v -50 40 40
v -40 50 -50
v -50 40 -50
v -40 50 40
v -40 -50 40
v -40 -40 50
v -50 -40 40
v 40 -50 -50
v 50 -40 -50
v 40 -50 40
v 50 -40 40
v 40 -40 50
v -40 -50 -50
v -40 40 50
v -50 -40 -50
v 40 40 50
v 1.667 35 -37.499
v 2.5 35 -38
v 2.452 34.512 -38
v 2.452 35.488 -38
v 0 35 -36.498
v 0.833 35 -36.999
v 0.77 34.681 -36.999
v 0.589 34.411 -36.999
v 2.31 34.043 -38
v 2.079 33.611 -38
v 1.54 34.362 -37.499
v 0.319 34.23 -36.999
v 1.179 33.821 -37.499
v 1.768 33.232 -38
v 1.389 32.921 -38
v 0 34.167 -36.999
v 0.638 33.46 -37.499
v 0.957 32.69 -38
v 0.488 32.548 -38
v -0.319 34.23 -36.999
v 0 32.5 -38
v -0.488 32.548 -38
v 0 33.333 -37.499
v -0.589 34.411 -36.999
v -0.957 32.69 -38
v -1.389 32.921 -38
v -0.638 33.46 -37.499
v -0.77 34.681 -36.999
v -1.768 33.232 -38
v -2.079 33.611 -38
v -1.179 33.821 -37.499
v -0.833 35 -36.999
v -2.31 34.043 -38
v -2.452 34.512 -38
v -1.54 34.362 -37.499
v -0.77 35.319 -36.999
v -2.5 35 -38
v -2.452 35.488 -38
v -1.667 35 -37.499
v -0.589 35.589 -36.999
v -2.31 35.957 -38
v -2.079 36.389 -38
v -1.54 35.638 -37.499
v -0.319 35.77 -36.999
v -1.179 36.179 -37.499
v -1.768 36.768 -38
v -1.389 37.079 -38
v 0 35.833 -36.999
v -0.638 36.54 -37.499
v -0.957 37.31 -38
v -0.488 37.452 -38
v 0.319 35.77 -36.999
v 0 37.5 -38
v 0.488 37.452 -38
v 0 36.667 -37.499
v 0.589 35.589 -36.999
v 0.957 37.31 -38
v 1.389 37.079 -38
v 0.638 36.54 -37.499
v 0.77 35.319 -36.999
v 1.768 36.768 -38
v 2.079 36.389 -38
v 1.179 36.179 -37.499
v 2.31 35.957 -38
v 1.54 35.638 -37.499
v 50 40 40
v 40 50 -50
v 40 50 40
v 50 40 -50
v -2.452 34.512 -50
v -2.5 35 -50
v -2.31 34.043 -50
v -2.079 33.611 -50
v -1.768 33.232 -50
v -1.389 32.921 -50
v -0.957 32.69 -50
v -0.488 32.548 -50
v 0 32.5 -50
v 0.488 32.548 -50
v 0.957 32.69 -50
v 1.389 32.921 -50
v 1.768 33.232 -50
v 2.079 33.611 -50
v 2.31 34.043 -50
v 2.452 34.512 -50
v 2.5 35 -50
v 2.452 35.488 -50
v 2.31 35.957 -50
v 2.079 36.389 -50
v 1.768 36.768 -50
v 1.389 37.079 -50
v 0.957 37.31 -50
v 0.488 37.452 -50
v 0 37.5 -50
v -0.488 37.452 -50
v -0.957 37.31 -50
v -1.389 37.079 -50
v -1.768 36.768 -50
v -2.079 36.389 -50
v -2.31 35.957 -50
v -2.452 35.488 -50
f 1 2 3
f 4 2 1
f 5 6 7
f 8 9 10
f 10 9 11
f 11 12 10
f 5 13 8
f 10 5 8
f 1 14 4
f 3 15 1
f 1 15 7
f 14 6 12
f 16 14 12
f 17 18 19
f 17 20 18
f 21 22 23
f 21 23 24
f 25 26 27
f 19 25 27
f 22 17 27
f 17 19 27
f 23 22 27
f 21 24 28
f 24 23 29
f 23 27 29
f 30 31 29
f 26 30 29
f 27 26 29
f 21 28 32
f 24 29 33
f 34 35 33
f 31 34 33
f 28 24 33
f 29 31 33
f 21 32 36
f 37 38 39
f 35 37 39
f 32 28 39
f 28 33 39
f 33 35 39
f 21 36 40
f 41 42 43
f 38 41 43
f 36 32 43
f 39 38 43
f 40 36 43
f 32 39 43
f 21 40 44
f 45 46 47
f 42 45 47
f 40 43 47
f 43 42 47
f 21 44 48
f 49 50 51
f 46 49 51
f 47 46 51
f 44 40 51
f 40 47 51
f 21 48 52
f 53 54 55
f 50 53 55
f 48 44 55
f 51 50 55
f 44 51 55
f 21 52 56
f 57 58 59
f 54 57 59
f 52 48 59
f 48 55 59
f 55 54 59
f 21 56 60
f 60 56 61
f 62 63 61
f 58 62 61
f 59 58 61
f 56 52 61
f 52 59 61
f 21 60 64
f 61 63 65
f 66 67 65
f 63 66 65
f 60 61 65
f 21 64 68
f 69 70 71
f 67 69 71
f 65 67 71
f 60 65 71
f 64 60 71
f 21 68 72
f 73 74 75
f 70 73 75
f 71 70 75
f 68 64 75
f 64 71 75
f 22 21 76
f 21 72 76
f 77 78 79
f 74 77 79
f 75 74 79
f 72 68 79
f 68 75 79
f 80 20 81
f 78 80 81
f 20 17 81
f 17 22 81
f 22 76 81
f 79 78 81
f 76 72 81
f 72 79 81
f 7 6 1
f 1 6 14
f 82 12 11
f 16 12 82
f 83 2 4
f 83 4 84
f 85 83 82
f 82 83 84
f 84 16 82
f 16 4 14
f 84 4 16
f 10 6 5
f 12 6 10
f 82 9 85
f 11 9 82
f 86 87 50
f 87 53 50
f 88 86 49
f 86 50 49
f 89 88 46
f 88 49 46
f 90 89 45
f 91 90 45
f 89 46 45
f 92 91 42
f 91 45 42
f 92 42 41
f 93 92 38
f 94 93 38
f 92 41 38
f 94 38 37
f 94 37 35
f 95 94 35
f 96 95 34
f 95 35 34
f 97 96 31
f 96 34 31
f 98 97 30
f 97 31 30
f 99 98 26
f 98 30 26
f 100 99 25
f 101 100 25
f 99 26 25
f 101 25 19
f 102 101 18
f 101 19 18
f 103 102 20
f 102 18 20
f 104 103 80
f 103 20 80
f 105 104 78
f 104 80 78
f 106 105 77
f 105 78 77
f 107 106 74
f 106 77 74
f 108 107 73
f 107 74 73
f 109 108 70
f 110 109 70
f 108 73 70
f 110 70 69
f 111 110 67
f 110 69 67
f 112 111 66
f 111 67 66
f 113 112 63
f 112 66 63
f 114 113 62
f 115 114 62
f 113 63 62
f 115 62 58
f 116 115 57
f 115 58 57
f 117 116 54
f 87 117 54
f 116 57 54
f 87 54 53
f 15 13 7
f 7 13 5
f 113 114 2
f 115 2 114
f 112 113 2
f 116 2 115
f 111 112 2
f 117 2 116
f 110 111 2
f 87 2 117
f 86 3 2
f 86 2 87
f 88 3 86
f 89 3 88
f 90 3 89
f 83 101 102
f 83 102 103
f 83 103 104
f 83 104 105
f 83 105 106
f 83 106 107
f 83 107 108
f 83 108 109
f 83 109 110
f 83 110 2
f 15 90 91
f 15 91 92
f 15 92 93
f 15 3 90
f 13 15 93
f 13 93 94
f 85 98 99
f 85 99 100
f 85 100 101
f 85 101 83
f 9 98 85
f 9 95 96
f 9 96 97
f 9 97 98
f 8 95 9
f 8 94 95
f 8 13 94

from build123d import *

# Parameters (mm, degrees)
F0_W     = 100
F0_H     = 100
F1_DEPTH = 50
F2_SIZE  = 10
F4_D     = 5
F4_DEPTH = 12
F4_TIP   = 1.5021515476


with BuildPart() as f1:
    # F0 (on Front) → F1 (new body, symmetric)
    with BuildSketch(Plane.XZ):
        Rectangle(F0_W, F0_H)
    extrude(amount=F1_DEPTH, both=True)

    # F2
    f2_edges = [f1.edges().sort_by_distance(p)[0] for p in [
        (-50, 0, 50),
        (0, -50, 50),
        (50, 0, 50),
        (0, 50, 50),
        (50, -50, 0),
        (50, 50, 0),
        (-50, 50, 0),
        (-50, -50, 0),
    ]]
    chamfer(f2_edges, length=F2_SIZE)

    # F4
    with Locations(Plane(origin=(0, 0, -50), x_dir=(1, 0, 0), z_dir=(0, 0, -1))):
        with Locations((0, -35)):
            Hole(F4_D / 2, depth=F4_DEPTH)
            with Locations((0, 0, -(F4_DEPTH + F4_TIP / 2))):  # 118° drill point
                Cone(0, F4_D / 2, F4_TIP, mode=Mode.SUBTRACT)


solid = f1.part
